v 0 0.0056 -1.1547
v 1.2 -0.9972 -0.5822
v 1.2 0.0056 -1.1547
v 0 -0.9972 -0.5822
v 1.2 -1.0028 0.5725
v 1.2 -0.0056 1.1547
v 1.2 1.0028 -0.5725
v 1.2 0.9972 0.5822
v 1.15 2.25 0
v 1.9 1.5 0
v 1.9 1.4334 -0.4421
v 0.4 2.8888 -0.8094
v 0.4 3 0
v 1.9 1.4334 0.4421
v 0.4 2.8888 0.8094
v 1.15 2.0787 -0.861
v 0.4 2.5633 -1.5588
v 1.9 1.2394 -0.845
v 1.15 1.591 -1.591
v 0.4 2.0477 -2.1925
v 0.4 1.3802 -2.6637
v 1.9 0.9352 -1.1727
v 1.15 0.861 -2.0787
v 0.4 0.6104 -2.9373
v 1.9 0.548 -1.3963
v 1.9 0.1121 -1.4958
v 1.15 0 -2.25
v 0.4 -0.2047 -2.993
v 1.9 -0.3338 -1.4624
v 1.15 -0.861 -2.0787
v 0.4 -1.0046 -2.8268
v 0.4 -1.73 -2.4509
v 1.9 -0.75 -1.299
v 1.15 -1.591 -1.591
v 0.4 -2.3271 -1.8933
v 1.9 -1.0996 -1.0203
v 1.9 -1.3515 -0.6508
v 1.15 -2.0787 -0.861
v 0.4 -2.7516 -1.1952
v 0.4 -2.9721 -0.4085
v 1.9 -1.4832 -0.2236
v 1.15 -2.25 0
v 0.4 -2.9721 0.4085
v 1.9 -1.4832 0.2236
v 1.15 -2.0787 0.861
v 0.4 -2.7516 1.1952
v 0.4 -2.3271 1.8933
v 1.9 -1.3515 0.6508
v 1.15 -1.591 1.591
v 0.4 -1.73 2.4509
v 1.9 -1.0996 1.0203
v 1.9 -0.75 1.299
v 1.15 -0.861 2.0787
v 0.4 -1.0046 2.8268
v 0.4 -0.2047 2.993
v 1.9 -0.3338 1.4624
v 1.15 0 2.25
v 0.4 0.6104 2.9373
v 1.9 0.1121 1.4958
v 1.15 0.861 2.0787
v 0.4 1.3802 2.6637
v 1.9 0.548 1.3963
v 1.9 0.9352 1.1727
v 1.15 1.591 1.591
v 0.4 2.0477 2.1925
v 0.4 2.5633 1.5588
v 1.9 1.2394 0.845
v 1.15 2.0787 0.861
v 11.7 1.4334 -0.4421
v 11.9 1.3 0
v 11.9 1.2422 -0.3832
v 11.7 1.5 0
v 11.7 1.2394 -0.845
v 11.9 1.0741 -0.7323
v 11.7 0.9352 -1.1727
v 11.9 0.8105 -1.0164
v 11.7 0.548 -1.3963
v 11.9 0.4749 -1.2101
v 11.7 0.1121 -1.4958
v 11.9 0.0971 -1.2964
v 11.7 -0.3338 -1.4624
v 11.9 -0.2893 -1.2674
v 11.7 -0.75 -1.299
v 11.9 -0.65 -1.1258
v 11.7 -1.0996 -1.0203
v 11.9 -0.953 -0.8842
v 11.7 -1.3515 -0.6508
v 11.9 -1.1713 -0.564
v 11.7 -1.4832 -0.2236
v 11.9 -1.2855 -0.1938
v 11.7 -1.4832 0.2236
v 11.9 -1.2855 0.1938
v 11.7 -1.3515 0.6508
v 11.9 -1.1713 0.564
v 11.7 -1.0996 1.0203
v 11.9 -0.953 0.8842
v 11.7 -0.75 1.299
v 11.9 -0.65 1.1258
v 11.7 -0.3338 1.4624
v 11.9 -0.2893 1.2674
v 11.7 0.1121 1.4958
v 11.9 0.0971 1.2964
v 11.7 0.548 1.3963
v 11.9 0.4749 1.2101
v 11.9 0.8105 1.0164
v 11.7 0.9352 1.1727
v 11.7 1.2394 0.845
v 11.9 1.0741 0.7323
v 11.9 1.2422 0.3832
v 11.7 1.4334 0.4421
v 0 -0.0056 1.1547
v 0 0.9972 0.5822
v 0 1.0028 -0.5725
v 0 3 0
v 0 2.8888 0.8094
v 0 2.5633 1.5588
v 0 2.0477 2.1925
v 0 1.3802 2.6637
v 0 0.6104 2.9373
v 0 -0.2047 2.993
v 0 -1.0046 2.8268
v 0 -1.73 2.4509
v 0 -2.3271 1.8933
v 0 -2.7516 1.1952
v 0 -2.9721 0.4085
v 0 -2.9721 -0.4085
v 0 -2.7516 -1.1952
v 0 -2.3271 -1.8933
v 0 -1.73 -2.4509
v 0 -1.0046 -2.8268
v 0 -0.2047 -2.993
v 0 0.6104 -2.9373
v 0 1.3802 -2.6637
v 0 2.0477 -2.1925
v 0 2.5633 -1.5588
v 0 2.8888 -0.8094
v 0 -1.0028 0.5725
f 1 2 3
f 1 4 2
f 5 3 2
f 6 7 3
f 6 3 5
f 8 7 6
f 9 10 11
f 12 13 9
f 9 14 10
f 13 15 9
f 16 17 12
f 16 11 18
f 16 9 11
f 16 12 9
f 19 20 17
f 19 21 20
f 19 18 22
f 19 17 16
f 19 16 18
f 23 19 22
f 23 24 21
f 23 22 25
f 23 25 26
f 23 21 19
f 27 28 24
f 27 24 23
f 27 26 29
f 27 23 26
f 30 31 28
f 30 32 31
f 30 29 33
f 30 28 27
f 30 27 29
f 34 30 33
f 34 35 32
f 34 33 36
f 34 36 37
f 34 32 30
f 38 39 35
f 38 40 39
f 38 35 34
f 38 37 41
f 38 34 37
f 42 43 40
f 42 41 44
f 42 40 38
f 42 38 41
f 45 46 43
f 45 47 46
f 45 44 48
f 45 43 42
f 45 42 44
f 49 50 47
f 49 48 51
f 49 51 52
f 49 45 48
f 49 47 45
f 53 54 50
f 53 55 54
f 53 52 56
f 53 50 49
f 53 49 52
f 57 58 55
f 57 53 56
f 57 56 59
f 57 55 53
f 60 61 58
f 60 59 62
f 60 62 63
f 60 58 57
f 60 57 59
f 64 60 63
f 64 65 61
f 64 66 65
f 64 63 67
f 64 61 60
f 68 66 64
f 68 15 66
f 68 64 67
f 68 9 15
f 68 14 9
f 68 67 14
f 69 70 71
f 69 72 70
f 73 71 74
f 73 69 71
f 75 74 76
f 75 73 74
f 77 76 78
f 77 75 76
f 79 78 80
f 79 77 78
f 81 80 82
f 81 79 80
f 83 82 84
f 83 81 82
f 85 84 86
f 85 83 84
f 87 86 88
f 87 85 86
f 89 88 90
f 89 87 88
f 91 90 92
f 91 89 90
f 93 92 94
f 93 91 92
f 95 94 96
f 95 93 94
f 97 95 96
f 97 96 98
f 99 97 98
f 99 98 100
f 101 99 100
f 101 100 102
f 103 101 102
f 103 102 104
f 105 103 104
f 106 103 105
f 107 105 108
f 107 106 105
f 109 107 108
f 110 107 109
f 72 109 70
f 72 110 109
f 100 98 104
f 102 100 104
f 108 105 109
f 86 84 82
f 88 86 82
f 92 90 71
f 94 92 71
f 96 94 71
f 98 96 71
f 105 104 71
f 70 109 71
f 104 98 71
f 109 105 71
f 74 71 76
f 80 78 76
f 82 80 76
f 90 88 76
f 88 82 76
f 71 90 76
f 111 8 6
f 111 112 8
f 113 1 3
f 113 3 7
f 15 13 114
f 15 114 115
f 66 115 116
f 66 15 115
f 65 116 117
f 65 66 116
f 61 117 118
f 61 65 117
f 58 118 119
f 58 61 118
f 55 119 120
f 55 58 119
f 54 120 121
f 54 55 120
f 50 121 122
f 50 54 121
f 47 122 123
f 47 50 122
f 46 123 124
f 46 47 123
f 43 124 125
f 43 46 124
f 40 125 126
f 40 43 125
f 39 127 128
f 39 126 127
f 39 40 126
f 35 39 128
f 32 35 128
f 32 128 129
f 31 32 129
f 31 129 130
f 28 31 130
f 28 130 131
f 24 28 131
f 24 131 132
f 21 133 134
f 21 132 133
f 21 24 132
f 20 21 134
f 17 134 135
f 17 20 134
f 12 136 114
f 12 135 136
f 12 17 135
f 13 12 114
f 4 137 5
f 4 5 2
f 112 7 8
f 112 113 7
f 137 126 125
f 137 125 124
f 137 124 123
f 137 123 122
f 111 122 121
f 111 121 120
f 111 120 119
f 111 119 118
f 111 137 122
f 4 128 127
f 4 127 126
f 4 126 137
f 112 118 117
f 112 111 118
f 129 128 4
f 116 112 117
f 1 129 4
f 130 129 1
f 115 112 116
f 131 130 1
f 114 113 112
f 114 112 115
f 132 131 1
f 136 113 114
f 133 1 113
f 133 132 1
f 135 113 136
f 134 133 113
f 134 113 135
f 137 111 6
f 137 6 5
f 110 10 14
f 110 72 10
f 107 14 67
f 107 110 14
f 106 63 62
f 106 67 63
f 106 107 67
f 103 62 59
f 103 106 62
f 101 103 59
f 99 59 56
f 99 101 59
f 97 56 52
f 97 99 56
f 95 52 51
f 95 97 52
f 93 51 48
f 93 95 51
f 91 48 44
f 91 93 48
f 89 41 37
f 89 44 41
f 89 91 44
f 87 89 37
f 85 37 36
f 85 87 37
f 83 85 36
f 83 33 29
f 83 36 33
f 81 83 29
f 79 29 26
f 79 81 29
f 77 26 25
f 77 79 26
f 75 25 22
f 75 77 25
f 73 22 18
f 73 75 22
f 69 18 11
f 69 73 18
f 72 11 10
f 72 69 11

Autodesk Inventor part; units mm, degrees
ref_plane "YZ Plane" through (0, 0, 0) normal (1, 0, 0) x (0, 1, 0)
ref_plane "XZ Plane" through (0, 0, 0) normal (0, 1, 0) x (-1, 0, 0)
ref_plane "XY Plane" through (0, 0, 0) normal (0, 0, 1) x (1, 0, 0)
sketch "Sketch1" plane through (0, 0, 0) normal (0, 0, 1) x (1, 0, 0)
  line L0 (0, 0) -> (0, 3)
  line L1 (0, 3) -> (0.4, 3)
  line L2 (0.4, 3) -> (1.9, 1.5)
  line L3 (1.9, 1.5) -> (11.9, 1.5)
  line L4 (11.9, 1.5) -> (11.9, 0)
  line L5 (11.9, 0) -> (0, 0)
  dimension "d0" = 10
  dimension "d1" = 45
  dimension "d2" = 1.9
  dimension "d3" = 1.5
  dimension "d4" = 3
revolve "Revolution1" add sketch "Sketch1" angle 360 about axis through (11.9, 0, 0) along (-1, 0, 0)
sketch "Sketch2" plane through (0, 0, 0) normal (-1, 0, 0) x (0, 0, 1)
  line L0 (0.5725, -1.0028) -> (-0.5822, -0.9972)
  line L1 (-0.5822, -0.9972) -> (-1.1547, 0.0056)
  line L2 (-1.1547, 0.0056) -> (-0.5725, 1.0028)
  line L3 (-0.5725, 1.0028) -> (0.5822, 0.9972)
  line L4 (0.5822, 0.9972) -> (1.1547, -0.0056)
  line L5 (1.1547, -0.0056) -> (0.5725, -1.0028)
  point P0 (0, 0)
  point P1 (0, 0)
  dimension "d6" = 2
extrude "Extrusion1" cut sketch "Sketch2" against normal blind 1.2
thread "Thread1" size "M3x0.5" class "6g" standard "ANSI Metric M Profile" full length
chamfer "Chamfer1" distance 0.2 angle 45 1 edges at (11.9, -1.5, 0)
properties part number "M3 x 10 mm FHCS"
